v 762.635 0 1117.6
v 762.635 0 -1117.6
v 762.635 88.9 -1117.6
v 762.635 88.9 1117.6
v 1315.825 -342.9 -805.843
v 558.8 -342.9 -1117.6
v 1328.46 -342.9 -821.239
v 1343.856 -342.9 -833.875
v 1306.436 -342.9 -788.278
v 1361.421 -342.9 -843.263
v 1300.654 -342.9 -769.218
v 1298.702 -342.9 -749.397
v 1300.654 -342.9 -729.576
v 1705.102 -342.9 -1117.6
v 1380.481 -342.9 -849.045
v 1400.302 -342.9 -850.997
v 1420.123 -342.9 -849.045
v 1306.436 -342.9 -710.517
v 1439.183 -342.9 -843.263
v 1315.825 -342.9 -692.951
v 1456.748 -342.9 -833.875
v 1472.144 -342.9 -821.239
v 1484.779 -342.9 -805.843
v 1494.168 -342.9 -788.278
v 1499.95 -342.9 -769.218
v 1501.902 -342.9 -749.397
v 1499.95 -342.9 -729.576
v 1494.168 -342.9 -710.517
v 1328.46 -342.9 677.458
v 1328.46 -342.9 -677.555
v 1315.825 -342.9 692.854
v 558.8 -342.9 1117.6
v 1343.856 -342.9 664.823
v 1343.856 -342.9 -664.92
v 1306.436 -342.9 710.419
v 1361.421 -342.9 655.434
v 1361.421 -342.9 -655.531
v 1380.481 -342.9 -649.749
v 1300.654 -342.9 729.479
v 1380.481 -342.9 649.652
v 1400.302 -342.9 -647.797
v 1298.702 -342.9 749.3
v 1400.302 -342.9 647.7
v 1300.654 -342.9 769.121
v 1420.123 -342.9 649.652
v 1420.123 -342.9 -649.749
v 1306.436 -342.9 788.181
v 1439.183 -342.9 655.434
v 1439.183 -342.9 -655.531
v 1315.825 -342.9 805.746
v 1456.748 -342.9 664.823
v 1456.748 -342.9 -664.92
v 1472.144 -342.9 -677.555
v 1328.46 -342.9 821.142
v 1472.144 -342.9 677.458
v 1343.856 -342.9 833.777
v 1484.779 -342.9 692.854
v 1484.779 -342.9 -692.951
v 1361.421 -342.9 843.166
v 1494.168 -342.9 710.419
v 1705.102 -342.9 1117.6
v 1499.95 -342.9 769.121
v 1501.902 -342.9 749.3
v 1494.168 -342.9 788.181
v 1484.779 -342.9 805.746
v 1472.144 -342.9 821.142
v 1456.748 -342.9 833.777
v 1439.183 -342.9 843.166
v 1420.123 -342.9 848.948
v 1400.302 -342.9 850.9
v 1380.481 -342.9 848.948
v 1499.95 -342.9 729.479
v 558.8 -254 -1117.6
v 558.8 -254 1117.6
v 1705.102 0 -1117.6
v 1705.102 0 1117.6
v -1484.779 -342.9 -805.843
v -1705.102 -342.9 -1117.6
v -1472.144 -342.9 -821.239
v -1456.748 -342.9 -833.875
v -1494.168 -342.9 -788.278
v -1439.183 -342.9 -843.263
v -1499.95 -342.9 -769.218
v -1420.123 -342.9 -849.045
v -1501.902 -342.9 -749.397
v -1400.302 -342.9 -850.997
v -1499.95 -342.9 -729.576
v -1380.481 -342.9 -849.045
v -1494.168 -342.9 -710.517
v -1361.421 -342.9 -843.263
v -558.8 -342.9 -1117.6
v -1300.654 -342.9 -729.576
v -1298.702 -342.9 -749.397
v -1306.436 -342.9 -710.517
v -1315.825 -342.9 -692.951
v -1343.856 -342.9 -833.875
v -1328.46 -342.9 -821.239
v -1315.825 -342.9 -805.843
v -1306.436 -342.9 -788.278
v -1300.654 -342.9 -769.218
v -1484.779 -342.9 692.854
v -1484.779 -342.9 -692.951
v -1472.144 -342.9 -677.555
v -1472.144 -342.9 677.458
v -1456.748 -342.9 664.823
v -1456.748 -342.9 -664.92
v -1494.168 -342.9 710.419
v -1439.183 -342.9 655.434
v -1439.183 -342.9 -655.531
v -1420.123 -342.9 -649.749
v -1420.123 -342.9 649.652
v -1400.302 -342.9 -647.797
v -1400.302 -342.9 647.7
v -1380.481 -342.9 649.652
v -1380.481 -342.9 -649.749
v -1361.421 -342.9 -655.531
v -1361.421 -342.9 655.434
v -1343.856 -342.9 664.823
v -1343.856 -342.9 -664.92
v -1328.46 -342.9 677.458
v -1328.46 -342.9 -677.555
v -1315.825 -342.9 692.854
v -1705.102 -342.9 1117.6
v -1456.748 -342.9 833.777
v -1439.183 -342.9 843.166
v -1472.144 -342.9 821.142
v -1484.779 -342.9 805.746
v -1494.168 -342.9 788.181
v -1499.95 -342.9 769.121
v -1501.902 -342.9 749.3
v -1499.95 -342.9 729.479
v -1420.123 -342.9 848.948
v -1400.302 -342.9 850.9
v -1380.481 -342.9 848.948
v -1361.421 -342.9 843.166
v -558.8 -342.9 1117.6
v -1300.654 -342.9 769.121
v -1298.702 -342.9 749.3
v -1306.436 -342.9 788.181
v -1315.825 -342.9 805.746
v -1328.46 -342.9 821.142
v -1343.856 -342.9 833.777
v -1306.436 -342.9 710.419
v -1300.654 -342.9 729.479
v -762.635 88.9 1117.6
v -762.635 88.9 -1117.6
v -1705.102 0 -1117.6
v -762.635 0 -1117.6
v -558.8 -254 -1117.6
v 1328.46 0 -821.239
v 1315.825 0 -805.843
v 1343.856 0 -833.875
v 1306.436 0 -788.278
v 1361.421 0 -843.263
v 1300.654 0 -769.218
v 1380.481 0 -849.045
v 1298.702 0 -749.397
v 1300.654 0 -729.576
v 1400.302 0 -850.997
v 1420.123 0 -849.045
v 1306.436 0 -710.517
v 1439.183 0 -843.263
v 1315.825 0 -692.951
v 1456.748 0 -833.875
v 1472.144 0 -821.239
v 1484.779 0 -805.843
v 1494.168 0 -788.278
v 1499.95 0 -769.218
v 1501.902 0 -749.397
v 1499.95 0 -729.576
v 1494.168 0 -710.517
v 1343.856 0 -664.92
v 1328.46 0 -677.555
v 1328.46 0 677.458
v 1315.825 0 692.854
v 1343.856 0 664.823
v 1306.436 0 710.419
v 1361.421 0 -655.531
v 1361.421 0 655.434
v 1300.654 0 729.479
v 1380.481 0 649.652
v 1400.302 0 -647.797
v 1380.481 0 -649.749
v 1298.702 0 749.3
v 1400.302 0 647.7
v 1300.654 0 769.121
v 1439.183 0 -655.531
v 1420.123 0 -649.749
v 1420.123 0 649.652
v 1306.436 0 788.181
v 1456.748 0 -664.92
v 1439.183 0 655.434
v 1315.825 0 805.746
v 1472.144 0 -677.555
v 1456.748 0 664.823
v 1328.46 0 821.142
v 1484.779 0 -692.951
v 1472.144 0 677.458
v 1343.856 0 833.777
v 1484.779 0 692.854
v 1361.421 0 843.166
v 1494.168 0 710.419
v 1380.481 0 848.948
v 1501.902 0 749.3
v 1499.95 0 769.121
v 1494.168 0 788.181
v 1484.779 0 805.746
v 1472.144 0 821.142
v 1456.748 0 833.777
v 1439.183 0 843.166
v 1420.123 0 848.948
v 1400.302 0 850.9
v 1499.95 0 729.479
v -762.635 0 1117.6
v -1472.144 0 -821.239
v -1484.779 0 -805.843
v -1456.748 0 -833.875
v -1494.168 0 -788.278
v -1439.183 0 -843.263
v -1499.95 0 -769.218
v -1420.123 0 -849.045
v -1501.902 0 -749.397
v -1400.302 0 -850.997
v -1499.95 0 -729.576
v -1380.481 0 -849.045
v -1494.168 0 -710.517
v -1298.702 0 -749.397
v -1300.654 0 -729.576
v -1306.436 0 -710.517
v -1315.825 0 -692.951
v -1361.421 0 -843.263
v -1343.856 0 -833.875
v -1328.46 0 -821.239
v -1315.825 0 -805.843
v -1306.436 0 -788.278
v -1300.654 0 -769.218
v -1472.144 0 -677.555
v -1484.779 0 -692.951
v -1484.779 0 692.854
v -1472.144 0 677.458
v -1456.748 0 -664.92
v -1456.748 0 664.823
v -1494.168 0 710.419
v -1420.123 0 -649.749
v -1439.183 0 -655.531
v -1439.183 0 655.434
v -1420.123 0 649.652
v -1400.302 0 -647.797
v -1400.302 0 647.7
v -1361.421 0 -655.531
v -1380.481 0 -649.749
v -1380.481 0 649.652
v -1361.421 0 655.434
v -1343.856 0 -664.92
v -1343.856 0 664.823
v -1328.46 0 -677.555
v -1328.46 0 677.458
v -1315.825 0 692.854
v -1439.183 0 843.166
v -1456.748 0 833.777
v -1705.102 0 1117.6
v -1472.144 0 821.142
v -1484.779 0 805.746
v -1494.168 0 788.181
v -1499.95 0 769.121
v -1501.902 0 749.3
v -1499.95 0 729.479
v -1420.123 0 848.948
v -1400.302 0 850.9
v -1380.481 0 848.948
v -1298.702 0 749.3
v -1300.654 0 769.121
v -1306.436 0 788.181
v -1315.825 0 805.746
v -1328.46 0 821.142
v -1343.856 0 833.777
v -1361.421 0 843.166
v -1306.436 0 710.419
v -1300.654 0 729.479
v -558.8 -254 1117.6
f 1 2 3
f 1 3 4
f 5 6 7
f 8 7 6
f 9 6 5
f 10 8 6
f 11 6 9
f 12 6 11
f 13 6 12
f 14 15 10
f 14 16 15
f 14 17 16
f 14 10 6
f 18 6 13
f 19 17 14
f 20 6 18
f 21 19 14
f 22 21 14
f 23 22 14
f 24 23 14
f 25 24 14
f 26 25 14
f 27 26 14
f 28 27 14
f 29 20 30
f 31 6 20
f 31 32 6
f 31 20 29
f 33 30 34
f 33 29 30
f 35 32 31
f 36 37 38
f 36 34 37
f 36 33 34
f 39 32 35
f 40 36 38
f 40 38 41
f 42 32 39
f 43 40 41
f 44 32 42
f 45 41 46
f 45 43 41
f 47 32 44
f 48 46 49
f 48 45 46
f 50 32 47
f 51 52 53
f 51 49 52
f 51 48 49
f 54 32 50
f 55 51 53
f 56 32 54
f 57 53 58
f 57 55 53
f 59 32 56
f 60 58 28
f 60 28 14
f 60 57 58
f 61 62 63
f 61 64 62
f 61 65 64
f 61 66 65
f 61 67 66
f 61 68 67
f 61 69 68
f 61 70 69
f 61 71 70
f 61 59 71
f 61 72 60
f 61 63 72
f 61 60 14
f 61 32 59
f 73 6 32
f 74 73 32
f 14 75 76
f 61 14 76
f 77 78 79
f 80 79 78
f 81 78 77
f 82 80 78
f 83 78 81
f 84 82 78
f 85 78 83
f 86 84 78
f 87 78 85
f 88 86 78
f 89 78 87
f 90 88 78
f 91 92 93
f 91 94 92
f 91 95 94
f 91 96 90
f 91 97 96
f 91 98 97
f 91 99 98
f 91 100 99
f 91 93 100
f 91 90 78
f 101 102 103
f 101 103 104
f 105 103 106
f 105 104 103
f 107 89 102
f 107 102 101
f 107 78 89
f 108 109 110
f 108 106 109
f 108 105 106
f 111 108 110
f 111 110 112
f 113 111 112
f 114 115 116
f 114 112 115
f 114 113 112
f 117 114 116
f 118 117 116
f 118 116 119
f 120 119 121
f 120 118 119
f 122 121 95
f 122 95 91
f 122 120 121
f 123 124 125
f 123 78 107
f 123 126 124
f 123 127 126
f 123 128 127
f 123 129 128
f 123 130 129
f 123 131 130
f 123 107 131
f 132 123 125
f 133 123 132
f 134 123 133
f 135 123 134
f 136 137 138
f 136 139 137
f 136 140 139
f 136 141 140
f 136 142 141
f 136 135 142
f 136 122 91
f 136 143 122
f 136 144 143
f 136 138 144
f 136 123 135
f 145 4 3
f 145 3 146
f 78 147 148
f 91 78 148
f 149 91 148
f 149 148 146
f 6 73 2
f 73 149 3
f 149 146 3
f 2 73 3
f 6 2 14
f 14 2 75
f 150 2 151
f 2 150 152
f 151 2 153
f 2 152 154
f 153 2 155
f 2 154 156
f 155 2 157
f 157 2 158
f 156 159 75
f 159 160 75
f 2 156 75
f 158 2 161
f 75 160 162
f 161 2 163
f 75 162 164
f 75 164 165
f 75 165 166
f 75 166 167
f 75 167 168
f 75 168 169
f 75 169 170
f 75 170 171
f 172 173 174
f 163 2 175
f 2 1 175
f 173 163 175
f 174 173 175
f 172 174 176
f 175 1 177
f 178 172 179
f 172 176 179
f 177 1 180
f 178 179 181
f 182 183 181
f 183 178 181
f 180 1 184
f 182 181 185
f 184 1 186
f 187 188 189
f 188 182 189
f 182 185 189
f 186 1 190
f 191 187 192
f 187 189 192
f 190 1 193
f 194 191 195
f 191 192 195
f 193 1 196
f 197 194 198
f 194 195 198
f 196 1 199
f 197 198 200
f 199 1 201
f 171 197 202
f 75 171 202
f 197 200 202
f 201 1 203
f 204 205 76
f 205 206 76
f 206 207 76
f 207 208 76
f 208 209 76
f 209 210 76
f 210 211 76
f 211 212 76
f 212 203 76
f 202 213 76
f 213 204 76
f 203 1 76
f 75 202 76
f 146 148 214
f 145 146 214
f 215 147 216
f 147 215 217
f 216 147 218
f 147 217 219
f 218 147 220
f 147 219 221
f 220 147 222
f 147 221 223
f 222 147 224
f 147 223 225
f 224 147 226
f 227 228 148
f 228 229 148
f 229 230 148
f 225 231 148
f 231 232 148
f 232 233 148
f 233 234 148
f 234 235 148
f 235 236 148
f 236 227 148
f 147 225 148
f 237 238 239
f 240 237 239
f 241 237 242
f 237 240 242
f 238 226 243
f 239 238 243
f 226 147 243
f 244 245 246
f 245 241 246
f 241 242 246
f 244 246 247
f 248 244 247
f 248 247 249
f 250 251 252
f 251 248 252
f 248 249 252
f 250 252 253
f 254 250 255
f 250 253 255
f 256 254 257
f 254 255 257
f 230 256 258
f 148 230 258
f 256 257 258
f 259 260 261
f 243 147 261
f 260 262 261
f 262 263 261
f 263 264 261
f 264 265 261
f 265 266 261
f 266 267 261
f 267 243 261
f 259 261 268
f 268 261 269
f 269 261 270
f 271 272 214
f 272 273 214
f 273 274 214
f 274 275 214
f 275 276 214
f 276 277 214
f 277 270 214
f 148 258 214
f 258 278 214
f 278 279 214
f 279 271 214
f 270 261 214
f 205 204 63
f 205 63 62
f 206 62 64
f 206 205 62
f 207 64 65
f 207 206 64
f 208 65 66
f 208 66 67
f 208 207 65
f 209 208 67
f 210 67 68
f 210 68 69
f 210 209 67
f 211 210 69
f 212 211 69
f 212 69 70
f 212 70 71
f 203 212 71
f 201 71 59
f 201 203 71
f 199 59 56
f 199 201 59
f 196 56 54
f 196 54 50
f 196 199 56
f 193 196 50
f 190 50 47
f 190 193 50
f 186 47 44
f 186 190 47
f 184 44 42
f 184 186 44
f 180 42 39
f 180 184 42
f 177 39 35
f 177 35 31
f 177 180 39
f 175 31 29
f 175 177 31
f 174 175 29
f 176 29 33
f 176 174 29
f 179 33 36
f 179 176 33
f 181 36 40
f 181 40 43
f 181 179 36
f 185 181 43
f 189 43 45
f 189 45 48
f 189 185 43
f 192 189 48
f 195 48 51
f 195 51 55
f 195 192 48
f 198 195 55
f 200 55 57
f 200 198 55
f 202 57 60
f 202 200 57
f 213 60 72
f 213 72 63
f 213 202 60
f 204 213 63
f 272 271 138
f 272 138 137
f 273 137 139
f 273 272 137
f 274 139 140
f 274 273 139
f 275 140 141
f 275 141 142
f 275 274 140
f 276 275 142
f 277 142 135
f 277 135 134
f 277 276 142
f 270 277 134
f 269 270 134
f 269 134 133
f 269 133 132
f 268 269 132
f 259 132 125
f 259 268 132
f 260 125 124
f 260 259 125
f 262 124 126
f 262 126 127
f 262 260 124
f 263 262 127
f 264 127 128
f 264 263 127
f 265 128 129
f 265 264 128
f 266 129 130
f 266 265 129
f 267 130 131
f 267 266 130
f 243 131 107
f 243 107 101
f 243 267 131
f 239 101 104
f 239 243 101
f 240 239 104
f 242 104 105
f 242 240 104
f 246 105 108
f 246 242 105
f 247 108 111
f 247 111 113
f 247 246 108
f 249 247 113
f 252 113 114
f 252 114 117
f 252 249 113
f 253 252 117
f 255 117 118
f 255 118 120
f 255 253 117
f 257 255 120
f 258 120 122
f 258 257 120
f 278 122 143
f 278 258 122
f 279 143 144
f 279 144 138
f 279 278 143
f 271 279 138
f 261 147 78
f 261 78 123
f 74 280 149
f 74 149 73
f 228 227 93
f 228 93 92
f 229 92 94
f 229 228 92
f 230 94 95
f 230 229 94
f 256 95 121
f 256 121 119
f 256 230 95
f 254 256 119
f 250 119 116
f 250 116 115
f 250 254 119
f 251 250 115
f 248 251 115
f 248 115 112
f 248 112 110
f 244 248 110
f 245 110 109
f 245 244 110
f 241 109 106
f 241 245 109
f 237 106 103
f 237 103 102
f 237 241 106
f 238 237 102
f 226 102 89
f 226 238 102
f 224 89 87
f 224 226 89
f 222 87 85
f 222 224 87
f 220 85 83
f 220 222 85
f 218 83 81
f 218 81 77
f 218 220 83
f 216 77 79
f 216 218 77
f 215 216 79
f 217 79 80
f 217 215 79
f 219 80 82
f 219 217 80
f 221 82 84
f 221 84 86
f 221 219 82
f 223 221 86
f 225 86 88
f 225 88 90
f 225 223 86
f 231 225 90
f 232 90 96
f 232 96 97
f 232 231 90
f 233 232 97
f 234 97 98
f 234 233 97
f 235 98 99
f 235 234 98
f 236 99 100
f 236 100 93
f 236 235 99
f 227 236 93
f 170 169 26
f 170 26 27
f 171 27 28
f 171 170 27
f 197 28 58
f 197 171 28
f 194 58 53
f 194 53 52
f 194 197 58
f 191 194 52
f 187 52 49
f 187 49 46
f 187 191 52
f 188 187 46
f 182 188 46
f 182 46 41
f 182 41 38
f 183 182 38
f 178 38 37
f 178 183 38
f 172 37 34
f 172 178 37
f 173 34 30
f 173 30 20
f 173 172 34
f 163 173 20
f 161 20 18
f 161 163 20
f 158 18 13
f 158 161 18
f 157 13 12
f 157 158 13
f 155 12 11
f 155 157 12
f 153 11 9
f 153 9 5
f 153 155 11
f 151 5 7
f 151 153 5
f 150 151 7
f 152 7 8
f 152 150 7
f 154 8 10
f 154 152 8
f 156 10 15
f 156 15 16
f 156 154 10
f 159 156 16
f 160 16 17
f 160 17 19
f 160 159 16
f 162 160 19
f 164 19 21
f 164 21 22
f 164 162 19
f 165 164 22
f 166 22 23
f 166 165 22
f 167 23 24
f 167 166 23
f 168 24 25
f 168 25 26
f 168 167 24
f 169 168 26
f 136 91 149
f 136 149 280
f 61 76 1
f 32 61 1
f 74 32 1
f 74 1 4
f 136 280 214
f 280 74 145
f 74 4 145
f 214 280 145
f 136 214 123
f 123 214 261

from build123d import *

# Parameters (mm, degrees)
F0_W     = 1117.6
F0_H     = 2235.2
F1_DEPTH = 331.47
F0_W_2   = 1146.302
F0_R     = 101.6
F2_DEPTH = 342.9
F3_W     = 1525.27
F3_H     = 2235.2
F4_DEPTH = 88.9
F5_W     = 1117.6
F5_H     = 2235.2
F6_DEPTH = 88.9


with BuildPart() as f1:
    # F0 (on Front) → F1 (new body)
    with BuildSketch(Plane.XZ):
        Rectangle(F0_W, F0_H)
    extrude(amount=F1_DEPTH)

    # F0 (on Front) → F2 (join)
    with BuildSketch(Plane.XZ):
        Rectangle(F0_W, F0_H)
        with Locations((1131.951, 0)):
            Rectangle(F0_W_2, F0_H)
        with Locations((1400.302, -749.397272)):
            Circle(F0_R, mode=Mode.SUBTRACT)
        with Locations((1400.302, 749.3)):
            Circle(F0_R, mode=Mode.SUBTRACT)
        with Locations((-1131.951, 0)):
            Rectangle(F0_W_2, F0_H)
        with Locations((-1400.302, -749.397272)):
            Circle(F0_R, mode=Mode.SUBTRACT)
        with Locations((-1400.302, 749.3)):
            Circle(F0_R, mode=Mode.SUBTRACT)
    extrude(amount=F2_DEPTH)

    # F3 (on face) → F4 (join)
    with BuildSketch(Plane(origin=(0, 0, 0), x_dir=(-1, 0, 0), z_dir=(0, 1, 0))):
        Rectangle(F3_W, F3_H)
    extrude(amount=F4_DEPTH)

    # F5 (on face) → F6 (cut)
    with BuildSketch(Plane.XZ.offset(342.9)):
        Rectangle(F5_W, F5_H)
    extrude(amount=-F6_DEPTH, mode=Mode.SUBTRACT)


solid = f1.part
